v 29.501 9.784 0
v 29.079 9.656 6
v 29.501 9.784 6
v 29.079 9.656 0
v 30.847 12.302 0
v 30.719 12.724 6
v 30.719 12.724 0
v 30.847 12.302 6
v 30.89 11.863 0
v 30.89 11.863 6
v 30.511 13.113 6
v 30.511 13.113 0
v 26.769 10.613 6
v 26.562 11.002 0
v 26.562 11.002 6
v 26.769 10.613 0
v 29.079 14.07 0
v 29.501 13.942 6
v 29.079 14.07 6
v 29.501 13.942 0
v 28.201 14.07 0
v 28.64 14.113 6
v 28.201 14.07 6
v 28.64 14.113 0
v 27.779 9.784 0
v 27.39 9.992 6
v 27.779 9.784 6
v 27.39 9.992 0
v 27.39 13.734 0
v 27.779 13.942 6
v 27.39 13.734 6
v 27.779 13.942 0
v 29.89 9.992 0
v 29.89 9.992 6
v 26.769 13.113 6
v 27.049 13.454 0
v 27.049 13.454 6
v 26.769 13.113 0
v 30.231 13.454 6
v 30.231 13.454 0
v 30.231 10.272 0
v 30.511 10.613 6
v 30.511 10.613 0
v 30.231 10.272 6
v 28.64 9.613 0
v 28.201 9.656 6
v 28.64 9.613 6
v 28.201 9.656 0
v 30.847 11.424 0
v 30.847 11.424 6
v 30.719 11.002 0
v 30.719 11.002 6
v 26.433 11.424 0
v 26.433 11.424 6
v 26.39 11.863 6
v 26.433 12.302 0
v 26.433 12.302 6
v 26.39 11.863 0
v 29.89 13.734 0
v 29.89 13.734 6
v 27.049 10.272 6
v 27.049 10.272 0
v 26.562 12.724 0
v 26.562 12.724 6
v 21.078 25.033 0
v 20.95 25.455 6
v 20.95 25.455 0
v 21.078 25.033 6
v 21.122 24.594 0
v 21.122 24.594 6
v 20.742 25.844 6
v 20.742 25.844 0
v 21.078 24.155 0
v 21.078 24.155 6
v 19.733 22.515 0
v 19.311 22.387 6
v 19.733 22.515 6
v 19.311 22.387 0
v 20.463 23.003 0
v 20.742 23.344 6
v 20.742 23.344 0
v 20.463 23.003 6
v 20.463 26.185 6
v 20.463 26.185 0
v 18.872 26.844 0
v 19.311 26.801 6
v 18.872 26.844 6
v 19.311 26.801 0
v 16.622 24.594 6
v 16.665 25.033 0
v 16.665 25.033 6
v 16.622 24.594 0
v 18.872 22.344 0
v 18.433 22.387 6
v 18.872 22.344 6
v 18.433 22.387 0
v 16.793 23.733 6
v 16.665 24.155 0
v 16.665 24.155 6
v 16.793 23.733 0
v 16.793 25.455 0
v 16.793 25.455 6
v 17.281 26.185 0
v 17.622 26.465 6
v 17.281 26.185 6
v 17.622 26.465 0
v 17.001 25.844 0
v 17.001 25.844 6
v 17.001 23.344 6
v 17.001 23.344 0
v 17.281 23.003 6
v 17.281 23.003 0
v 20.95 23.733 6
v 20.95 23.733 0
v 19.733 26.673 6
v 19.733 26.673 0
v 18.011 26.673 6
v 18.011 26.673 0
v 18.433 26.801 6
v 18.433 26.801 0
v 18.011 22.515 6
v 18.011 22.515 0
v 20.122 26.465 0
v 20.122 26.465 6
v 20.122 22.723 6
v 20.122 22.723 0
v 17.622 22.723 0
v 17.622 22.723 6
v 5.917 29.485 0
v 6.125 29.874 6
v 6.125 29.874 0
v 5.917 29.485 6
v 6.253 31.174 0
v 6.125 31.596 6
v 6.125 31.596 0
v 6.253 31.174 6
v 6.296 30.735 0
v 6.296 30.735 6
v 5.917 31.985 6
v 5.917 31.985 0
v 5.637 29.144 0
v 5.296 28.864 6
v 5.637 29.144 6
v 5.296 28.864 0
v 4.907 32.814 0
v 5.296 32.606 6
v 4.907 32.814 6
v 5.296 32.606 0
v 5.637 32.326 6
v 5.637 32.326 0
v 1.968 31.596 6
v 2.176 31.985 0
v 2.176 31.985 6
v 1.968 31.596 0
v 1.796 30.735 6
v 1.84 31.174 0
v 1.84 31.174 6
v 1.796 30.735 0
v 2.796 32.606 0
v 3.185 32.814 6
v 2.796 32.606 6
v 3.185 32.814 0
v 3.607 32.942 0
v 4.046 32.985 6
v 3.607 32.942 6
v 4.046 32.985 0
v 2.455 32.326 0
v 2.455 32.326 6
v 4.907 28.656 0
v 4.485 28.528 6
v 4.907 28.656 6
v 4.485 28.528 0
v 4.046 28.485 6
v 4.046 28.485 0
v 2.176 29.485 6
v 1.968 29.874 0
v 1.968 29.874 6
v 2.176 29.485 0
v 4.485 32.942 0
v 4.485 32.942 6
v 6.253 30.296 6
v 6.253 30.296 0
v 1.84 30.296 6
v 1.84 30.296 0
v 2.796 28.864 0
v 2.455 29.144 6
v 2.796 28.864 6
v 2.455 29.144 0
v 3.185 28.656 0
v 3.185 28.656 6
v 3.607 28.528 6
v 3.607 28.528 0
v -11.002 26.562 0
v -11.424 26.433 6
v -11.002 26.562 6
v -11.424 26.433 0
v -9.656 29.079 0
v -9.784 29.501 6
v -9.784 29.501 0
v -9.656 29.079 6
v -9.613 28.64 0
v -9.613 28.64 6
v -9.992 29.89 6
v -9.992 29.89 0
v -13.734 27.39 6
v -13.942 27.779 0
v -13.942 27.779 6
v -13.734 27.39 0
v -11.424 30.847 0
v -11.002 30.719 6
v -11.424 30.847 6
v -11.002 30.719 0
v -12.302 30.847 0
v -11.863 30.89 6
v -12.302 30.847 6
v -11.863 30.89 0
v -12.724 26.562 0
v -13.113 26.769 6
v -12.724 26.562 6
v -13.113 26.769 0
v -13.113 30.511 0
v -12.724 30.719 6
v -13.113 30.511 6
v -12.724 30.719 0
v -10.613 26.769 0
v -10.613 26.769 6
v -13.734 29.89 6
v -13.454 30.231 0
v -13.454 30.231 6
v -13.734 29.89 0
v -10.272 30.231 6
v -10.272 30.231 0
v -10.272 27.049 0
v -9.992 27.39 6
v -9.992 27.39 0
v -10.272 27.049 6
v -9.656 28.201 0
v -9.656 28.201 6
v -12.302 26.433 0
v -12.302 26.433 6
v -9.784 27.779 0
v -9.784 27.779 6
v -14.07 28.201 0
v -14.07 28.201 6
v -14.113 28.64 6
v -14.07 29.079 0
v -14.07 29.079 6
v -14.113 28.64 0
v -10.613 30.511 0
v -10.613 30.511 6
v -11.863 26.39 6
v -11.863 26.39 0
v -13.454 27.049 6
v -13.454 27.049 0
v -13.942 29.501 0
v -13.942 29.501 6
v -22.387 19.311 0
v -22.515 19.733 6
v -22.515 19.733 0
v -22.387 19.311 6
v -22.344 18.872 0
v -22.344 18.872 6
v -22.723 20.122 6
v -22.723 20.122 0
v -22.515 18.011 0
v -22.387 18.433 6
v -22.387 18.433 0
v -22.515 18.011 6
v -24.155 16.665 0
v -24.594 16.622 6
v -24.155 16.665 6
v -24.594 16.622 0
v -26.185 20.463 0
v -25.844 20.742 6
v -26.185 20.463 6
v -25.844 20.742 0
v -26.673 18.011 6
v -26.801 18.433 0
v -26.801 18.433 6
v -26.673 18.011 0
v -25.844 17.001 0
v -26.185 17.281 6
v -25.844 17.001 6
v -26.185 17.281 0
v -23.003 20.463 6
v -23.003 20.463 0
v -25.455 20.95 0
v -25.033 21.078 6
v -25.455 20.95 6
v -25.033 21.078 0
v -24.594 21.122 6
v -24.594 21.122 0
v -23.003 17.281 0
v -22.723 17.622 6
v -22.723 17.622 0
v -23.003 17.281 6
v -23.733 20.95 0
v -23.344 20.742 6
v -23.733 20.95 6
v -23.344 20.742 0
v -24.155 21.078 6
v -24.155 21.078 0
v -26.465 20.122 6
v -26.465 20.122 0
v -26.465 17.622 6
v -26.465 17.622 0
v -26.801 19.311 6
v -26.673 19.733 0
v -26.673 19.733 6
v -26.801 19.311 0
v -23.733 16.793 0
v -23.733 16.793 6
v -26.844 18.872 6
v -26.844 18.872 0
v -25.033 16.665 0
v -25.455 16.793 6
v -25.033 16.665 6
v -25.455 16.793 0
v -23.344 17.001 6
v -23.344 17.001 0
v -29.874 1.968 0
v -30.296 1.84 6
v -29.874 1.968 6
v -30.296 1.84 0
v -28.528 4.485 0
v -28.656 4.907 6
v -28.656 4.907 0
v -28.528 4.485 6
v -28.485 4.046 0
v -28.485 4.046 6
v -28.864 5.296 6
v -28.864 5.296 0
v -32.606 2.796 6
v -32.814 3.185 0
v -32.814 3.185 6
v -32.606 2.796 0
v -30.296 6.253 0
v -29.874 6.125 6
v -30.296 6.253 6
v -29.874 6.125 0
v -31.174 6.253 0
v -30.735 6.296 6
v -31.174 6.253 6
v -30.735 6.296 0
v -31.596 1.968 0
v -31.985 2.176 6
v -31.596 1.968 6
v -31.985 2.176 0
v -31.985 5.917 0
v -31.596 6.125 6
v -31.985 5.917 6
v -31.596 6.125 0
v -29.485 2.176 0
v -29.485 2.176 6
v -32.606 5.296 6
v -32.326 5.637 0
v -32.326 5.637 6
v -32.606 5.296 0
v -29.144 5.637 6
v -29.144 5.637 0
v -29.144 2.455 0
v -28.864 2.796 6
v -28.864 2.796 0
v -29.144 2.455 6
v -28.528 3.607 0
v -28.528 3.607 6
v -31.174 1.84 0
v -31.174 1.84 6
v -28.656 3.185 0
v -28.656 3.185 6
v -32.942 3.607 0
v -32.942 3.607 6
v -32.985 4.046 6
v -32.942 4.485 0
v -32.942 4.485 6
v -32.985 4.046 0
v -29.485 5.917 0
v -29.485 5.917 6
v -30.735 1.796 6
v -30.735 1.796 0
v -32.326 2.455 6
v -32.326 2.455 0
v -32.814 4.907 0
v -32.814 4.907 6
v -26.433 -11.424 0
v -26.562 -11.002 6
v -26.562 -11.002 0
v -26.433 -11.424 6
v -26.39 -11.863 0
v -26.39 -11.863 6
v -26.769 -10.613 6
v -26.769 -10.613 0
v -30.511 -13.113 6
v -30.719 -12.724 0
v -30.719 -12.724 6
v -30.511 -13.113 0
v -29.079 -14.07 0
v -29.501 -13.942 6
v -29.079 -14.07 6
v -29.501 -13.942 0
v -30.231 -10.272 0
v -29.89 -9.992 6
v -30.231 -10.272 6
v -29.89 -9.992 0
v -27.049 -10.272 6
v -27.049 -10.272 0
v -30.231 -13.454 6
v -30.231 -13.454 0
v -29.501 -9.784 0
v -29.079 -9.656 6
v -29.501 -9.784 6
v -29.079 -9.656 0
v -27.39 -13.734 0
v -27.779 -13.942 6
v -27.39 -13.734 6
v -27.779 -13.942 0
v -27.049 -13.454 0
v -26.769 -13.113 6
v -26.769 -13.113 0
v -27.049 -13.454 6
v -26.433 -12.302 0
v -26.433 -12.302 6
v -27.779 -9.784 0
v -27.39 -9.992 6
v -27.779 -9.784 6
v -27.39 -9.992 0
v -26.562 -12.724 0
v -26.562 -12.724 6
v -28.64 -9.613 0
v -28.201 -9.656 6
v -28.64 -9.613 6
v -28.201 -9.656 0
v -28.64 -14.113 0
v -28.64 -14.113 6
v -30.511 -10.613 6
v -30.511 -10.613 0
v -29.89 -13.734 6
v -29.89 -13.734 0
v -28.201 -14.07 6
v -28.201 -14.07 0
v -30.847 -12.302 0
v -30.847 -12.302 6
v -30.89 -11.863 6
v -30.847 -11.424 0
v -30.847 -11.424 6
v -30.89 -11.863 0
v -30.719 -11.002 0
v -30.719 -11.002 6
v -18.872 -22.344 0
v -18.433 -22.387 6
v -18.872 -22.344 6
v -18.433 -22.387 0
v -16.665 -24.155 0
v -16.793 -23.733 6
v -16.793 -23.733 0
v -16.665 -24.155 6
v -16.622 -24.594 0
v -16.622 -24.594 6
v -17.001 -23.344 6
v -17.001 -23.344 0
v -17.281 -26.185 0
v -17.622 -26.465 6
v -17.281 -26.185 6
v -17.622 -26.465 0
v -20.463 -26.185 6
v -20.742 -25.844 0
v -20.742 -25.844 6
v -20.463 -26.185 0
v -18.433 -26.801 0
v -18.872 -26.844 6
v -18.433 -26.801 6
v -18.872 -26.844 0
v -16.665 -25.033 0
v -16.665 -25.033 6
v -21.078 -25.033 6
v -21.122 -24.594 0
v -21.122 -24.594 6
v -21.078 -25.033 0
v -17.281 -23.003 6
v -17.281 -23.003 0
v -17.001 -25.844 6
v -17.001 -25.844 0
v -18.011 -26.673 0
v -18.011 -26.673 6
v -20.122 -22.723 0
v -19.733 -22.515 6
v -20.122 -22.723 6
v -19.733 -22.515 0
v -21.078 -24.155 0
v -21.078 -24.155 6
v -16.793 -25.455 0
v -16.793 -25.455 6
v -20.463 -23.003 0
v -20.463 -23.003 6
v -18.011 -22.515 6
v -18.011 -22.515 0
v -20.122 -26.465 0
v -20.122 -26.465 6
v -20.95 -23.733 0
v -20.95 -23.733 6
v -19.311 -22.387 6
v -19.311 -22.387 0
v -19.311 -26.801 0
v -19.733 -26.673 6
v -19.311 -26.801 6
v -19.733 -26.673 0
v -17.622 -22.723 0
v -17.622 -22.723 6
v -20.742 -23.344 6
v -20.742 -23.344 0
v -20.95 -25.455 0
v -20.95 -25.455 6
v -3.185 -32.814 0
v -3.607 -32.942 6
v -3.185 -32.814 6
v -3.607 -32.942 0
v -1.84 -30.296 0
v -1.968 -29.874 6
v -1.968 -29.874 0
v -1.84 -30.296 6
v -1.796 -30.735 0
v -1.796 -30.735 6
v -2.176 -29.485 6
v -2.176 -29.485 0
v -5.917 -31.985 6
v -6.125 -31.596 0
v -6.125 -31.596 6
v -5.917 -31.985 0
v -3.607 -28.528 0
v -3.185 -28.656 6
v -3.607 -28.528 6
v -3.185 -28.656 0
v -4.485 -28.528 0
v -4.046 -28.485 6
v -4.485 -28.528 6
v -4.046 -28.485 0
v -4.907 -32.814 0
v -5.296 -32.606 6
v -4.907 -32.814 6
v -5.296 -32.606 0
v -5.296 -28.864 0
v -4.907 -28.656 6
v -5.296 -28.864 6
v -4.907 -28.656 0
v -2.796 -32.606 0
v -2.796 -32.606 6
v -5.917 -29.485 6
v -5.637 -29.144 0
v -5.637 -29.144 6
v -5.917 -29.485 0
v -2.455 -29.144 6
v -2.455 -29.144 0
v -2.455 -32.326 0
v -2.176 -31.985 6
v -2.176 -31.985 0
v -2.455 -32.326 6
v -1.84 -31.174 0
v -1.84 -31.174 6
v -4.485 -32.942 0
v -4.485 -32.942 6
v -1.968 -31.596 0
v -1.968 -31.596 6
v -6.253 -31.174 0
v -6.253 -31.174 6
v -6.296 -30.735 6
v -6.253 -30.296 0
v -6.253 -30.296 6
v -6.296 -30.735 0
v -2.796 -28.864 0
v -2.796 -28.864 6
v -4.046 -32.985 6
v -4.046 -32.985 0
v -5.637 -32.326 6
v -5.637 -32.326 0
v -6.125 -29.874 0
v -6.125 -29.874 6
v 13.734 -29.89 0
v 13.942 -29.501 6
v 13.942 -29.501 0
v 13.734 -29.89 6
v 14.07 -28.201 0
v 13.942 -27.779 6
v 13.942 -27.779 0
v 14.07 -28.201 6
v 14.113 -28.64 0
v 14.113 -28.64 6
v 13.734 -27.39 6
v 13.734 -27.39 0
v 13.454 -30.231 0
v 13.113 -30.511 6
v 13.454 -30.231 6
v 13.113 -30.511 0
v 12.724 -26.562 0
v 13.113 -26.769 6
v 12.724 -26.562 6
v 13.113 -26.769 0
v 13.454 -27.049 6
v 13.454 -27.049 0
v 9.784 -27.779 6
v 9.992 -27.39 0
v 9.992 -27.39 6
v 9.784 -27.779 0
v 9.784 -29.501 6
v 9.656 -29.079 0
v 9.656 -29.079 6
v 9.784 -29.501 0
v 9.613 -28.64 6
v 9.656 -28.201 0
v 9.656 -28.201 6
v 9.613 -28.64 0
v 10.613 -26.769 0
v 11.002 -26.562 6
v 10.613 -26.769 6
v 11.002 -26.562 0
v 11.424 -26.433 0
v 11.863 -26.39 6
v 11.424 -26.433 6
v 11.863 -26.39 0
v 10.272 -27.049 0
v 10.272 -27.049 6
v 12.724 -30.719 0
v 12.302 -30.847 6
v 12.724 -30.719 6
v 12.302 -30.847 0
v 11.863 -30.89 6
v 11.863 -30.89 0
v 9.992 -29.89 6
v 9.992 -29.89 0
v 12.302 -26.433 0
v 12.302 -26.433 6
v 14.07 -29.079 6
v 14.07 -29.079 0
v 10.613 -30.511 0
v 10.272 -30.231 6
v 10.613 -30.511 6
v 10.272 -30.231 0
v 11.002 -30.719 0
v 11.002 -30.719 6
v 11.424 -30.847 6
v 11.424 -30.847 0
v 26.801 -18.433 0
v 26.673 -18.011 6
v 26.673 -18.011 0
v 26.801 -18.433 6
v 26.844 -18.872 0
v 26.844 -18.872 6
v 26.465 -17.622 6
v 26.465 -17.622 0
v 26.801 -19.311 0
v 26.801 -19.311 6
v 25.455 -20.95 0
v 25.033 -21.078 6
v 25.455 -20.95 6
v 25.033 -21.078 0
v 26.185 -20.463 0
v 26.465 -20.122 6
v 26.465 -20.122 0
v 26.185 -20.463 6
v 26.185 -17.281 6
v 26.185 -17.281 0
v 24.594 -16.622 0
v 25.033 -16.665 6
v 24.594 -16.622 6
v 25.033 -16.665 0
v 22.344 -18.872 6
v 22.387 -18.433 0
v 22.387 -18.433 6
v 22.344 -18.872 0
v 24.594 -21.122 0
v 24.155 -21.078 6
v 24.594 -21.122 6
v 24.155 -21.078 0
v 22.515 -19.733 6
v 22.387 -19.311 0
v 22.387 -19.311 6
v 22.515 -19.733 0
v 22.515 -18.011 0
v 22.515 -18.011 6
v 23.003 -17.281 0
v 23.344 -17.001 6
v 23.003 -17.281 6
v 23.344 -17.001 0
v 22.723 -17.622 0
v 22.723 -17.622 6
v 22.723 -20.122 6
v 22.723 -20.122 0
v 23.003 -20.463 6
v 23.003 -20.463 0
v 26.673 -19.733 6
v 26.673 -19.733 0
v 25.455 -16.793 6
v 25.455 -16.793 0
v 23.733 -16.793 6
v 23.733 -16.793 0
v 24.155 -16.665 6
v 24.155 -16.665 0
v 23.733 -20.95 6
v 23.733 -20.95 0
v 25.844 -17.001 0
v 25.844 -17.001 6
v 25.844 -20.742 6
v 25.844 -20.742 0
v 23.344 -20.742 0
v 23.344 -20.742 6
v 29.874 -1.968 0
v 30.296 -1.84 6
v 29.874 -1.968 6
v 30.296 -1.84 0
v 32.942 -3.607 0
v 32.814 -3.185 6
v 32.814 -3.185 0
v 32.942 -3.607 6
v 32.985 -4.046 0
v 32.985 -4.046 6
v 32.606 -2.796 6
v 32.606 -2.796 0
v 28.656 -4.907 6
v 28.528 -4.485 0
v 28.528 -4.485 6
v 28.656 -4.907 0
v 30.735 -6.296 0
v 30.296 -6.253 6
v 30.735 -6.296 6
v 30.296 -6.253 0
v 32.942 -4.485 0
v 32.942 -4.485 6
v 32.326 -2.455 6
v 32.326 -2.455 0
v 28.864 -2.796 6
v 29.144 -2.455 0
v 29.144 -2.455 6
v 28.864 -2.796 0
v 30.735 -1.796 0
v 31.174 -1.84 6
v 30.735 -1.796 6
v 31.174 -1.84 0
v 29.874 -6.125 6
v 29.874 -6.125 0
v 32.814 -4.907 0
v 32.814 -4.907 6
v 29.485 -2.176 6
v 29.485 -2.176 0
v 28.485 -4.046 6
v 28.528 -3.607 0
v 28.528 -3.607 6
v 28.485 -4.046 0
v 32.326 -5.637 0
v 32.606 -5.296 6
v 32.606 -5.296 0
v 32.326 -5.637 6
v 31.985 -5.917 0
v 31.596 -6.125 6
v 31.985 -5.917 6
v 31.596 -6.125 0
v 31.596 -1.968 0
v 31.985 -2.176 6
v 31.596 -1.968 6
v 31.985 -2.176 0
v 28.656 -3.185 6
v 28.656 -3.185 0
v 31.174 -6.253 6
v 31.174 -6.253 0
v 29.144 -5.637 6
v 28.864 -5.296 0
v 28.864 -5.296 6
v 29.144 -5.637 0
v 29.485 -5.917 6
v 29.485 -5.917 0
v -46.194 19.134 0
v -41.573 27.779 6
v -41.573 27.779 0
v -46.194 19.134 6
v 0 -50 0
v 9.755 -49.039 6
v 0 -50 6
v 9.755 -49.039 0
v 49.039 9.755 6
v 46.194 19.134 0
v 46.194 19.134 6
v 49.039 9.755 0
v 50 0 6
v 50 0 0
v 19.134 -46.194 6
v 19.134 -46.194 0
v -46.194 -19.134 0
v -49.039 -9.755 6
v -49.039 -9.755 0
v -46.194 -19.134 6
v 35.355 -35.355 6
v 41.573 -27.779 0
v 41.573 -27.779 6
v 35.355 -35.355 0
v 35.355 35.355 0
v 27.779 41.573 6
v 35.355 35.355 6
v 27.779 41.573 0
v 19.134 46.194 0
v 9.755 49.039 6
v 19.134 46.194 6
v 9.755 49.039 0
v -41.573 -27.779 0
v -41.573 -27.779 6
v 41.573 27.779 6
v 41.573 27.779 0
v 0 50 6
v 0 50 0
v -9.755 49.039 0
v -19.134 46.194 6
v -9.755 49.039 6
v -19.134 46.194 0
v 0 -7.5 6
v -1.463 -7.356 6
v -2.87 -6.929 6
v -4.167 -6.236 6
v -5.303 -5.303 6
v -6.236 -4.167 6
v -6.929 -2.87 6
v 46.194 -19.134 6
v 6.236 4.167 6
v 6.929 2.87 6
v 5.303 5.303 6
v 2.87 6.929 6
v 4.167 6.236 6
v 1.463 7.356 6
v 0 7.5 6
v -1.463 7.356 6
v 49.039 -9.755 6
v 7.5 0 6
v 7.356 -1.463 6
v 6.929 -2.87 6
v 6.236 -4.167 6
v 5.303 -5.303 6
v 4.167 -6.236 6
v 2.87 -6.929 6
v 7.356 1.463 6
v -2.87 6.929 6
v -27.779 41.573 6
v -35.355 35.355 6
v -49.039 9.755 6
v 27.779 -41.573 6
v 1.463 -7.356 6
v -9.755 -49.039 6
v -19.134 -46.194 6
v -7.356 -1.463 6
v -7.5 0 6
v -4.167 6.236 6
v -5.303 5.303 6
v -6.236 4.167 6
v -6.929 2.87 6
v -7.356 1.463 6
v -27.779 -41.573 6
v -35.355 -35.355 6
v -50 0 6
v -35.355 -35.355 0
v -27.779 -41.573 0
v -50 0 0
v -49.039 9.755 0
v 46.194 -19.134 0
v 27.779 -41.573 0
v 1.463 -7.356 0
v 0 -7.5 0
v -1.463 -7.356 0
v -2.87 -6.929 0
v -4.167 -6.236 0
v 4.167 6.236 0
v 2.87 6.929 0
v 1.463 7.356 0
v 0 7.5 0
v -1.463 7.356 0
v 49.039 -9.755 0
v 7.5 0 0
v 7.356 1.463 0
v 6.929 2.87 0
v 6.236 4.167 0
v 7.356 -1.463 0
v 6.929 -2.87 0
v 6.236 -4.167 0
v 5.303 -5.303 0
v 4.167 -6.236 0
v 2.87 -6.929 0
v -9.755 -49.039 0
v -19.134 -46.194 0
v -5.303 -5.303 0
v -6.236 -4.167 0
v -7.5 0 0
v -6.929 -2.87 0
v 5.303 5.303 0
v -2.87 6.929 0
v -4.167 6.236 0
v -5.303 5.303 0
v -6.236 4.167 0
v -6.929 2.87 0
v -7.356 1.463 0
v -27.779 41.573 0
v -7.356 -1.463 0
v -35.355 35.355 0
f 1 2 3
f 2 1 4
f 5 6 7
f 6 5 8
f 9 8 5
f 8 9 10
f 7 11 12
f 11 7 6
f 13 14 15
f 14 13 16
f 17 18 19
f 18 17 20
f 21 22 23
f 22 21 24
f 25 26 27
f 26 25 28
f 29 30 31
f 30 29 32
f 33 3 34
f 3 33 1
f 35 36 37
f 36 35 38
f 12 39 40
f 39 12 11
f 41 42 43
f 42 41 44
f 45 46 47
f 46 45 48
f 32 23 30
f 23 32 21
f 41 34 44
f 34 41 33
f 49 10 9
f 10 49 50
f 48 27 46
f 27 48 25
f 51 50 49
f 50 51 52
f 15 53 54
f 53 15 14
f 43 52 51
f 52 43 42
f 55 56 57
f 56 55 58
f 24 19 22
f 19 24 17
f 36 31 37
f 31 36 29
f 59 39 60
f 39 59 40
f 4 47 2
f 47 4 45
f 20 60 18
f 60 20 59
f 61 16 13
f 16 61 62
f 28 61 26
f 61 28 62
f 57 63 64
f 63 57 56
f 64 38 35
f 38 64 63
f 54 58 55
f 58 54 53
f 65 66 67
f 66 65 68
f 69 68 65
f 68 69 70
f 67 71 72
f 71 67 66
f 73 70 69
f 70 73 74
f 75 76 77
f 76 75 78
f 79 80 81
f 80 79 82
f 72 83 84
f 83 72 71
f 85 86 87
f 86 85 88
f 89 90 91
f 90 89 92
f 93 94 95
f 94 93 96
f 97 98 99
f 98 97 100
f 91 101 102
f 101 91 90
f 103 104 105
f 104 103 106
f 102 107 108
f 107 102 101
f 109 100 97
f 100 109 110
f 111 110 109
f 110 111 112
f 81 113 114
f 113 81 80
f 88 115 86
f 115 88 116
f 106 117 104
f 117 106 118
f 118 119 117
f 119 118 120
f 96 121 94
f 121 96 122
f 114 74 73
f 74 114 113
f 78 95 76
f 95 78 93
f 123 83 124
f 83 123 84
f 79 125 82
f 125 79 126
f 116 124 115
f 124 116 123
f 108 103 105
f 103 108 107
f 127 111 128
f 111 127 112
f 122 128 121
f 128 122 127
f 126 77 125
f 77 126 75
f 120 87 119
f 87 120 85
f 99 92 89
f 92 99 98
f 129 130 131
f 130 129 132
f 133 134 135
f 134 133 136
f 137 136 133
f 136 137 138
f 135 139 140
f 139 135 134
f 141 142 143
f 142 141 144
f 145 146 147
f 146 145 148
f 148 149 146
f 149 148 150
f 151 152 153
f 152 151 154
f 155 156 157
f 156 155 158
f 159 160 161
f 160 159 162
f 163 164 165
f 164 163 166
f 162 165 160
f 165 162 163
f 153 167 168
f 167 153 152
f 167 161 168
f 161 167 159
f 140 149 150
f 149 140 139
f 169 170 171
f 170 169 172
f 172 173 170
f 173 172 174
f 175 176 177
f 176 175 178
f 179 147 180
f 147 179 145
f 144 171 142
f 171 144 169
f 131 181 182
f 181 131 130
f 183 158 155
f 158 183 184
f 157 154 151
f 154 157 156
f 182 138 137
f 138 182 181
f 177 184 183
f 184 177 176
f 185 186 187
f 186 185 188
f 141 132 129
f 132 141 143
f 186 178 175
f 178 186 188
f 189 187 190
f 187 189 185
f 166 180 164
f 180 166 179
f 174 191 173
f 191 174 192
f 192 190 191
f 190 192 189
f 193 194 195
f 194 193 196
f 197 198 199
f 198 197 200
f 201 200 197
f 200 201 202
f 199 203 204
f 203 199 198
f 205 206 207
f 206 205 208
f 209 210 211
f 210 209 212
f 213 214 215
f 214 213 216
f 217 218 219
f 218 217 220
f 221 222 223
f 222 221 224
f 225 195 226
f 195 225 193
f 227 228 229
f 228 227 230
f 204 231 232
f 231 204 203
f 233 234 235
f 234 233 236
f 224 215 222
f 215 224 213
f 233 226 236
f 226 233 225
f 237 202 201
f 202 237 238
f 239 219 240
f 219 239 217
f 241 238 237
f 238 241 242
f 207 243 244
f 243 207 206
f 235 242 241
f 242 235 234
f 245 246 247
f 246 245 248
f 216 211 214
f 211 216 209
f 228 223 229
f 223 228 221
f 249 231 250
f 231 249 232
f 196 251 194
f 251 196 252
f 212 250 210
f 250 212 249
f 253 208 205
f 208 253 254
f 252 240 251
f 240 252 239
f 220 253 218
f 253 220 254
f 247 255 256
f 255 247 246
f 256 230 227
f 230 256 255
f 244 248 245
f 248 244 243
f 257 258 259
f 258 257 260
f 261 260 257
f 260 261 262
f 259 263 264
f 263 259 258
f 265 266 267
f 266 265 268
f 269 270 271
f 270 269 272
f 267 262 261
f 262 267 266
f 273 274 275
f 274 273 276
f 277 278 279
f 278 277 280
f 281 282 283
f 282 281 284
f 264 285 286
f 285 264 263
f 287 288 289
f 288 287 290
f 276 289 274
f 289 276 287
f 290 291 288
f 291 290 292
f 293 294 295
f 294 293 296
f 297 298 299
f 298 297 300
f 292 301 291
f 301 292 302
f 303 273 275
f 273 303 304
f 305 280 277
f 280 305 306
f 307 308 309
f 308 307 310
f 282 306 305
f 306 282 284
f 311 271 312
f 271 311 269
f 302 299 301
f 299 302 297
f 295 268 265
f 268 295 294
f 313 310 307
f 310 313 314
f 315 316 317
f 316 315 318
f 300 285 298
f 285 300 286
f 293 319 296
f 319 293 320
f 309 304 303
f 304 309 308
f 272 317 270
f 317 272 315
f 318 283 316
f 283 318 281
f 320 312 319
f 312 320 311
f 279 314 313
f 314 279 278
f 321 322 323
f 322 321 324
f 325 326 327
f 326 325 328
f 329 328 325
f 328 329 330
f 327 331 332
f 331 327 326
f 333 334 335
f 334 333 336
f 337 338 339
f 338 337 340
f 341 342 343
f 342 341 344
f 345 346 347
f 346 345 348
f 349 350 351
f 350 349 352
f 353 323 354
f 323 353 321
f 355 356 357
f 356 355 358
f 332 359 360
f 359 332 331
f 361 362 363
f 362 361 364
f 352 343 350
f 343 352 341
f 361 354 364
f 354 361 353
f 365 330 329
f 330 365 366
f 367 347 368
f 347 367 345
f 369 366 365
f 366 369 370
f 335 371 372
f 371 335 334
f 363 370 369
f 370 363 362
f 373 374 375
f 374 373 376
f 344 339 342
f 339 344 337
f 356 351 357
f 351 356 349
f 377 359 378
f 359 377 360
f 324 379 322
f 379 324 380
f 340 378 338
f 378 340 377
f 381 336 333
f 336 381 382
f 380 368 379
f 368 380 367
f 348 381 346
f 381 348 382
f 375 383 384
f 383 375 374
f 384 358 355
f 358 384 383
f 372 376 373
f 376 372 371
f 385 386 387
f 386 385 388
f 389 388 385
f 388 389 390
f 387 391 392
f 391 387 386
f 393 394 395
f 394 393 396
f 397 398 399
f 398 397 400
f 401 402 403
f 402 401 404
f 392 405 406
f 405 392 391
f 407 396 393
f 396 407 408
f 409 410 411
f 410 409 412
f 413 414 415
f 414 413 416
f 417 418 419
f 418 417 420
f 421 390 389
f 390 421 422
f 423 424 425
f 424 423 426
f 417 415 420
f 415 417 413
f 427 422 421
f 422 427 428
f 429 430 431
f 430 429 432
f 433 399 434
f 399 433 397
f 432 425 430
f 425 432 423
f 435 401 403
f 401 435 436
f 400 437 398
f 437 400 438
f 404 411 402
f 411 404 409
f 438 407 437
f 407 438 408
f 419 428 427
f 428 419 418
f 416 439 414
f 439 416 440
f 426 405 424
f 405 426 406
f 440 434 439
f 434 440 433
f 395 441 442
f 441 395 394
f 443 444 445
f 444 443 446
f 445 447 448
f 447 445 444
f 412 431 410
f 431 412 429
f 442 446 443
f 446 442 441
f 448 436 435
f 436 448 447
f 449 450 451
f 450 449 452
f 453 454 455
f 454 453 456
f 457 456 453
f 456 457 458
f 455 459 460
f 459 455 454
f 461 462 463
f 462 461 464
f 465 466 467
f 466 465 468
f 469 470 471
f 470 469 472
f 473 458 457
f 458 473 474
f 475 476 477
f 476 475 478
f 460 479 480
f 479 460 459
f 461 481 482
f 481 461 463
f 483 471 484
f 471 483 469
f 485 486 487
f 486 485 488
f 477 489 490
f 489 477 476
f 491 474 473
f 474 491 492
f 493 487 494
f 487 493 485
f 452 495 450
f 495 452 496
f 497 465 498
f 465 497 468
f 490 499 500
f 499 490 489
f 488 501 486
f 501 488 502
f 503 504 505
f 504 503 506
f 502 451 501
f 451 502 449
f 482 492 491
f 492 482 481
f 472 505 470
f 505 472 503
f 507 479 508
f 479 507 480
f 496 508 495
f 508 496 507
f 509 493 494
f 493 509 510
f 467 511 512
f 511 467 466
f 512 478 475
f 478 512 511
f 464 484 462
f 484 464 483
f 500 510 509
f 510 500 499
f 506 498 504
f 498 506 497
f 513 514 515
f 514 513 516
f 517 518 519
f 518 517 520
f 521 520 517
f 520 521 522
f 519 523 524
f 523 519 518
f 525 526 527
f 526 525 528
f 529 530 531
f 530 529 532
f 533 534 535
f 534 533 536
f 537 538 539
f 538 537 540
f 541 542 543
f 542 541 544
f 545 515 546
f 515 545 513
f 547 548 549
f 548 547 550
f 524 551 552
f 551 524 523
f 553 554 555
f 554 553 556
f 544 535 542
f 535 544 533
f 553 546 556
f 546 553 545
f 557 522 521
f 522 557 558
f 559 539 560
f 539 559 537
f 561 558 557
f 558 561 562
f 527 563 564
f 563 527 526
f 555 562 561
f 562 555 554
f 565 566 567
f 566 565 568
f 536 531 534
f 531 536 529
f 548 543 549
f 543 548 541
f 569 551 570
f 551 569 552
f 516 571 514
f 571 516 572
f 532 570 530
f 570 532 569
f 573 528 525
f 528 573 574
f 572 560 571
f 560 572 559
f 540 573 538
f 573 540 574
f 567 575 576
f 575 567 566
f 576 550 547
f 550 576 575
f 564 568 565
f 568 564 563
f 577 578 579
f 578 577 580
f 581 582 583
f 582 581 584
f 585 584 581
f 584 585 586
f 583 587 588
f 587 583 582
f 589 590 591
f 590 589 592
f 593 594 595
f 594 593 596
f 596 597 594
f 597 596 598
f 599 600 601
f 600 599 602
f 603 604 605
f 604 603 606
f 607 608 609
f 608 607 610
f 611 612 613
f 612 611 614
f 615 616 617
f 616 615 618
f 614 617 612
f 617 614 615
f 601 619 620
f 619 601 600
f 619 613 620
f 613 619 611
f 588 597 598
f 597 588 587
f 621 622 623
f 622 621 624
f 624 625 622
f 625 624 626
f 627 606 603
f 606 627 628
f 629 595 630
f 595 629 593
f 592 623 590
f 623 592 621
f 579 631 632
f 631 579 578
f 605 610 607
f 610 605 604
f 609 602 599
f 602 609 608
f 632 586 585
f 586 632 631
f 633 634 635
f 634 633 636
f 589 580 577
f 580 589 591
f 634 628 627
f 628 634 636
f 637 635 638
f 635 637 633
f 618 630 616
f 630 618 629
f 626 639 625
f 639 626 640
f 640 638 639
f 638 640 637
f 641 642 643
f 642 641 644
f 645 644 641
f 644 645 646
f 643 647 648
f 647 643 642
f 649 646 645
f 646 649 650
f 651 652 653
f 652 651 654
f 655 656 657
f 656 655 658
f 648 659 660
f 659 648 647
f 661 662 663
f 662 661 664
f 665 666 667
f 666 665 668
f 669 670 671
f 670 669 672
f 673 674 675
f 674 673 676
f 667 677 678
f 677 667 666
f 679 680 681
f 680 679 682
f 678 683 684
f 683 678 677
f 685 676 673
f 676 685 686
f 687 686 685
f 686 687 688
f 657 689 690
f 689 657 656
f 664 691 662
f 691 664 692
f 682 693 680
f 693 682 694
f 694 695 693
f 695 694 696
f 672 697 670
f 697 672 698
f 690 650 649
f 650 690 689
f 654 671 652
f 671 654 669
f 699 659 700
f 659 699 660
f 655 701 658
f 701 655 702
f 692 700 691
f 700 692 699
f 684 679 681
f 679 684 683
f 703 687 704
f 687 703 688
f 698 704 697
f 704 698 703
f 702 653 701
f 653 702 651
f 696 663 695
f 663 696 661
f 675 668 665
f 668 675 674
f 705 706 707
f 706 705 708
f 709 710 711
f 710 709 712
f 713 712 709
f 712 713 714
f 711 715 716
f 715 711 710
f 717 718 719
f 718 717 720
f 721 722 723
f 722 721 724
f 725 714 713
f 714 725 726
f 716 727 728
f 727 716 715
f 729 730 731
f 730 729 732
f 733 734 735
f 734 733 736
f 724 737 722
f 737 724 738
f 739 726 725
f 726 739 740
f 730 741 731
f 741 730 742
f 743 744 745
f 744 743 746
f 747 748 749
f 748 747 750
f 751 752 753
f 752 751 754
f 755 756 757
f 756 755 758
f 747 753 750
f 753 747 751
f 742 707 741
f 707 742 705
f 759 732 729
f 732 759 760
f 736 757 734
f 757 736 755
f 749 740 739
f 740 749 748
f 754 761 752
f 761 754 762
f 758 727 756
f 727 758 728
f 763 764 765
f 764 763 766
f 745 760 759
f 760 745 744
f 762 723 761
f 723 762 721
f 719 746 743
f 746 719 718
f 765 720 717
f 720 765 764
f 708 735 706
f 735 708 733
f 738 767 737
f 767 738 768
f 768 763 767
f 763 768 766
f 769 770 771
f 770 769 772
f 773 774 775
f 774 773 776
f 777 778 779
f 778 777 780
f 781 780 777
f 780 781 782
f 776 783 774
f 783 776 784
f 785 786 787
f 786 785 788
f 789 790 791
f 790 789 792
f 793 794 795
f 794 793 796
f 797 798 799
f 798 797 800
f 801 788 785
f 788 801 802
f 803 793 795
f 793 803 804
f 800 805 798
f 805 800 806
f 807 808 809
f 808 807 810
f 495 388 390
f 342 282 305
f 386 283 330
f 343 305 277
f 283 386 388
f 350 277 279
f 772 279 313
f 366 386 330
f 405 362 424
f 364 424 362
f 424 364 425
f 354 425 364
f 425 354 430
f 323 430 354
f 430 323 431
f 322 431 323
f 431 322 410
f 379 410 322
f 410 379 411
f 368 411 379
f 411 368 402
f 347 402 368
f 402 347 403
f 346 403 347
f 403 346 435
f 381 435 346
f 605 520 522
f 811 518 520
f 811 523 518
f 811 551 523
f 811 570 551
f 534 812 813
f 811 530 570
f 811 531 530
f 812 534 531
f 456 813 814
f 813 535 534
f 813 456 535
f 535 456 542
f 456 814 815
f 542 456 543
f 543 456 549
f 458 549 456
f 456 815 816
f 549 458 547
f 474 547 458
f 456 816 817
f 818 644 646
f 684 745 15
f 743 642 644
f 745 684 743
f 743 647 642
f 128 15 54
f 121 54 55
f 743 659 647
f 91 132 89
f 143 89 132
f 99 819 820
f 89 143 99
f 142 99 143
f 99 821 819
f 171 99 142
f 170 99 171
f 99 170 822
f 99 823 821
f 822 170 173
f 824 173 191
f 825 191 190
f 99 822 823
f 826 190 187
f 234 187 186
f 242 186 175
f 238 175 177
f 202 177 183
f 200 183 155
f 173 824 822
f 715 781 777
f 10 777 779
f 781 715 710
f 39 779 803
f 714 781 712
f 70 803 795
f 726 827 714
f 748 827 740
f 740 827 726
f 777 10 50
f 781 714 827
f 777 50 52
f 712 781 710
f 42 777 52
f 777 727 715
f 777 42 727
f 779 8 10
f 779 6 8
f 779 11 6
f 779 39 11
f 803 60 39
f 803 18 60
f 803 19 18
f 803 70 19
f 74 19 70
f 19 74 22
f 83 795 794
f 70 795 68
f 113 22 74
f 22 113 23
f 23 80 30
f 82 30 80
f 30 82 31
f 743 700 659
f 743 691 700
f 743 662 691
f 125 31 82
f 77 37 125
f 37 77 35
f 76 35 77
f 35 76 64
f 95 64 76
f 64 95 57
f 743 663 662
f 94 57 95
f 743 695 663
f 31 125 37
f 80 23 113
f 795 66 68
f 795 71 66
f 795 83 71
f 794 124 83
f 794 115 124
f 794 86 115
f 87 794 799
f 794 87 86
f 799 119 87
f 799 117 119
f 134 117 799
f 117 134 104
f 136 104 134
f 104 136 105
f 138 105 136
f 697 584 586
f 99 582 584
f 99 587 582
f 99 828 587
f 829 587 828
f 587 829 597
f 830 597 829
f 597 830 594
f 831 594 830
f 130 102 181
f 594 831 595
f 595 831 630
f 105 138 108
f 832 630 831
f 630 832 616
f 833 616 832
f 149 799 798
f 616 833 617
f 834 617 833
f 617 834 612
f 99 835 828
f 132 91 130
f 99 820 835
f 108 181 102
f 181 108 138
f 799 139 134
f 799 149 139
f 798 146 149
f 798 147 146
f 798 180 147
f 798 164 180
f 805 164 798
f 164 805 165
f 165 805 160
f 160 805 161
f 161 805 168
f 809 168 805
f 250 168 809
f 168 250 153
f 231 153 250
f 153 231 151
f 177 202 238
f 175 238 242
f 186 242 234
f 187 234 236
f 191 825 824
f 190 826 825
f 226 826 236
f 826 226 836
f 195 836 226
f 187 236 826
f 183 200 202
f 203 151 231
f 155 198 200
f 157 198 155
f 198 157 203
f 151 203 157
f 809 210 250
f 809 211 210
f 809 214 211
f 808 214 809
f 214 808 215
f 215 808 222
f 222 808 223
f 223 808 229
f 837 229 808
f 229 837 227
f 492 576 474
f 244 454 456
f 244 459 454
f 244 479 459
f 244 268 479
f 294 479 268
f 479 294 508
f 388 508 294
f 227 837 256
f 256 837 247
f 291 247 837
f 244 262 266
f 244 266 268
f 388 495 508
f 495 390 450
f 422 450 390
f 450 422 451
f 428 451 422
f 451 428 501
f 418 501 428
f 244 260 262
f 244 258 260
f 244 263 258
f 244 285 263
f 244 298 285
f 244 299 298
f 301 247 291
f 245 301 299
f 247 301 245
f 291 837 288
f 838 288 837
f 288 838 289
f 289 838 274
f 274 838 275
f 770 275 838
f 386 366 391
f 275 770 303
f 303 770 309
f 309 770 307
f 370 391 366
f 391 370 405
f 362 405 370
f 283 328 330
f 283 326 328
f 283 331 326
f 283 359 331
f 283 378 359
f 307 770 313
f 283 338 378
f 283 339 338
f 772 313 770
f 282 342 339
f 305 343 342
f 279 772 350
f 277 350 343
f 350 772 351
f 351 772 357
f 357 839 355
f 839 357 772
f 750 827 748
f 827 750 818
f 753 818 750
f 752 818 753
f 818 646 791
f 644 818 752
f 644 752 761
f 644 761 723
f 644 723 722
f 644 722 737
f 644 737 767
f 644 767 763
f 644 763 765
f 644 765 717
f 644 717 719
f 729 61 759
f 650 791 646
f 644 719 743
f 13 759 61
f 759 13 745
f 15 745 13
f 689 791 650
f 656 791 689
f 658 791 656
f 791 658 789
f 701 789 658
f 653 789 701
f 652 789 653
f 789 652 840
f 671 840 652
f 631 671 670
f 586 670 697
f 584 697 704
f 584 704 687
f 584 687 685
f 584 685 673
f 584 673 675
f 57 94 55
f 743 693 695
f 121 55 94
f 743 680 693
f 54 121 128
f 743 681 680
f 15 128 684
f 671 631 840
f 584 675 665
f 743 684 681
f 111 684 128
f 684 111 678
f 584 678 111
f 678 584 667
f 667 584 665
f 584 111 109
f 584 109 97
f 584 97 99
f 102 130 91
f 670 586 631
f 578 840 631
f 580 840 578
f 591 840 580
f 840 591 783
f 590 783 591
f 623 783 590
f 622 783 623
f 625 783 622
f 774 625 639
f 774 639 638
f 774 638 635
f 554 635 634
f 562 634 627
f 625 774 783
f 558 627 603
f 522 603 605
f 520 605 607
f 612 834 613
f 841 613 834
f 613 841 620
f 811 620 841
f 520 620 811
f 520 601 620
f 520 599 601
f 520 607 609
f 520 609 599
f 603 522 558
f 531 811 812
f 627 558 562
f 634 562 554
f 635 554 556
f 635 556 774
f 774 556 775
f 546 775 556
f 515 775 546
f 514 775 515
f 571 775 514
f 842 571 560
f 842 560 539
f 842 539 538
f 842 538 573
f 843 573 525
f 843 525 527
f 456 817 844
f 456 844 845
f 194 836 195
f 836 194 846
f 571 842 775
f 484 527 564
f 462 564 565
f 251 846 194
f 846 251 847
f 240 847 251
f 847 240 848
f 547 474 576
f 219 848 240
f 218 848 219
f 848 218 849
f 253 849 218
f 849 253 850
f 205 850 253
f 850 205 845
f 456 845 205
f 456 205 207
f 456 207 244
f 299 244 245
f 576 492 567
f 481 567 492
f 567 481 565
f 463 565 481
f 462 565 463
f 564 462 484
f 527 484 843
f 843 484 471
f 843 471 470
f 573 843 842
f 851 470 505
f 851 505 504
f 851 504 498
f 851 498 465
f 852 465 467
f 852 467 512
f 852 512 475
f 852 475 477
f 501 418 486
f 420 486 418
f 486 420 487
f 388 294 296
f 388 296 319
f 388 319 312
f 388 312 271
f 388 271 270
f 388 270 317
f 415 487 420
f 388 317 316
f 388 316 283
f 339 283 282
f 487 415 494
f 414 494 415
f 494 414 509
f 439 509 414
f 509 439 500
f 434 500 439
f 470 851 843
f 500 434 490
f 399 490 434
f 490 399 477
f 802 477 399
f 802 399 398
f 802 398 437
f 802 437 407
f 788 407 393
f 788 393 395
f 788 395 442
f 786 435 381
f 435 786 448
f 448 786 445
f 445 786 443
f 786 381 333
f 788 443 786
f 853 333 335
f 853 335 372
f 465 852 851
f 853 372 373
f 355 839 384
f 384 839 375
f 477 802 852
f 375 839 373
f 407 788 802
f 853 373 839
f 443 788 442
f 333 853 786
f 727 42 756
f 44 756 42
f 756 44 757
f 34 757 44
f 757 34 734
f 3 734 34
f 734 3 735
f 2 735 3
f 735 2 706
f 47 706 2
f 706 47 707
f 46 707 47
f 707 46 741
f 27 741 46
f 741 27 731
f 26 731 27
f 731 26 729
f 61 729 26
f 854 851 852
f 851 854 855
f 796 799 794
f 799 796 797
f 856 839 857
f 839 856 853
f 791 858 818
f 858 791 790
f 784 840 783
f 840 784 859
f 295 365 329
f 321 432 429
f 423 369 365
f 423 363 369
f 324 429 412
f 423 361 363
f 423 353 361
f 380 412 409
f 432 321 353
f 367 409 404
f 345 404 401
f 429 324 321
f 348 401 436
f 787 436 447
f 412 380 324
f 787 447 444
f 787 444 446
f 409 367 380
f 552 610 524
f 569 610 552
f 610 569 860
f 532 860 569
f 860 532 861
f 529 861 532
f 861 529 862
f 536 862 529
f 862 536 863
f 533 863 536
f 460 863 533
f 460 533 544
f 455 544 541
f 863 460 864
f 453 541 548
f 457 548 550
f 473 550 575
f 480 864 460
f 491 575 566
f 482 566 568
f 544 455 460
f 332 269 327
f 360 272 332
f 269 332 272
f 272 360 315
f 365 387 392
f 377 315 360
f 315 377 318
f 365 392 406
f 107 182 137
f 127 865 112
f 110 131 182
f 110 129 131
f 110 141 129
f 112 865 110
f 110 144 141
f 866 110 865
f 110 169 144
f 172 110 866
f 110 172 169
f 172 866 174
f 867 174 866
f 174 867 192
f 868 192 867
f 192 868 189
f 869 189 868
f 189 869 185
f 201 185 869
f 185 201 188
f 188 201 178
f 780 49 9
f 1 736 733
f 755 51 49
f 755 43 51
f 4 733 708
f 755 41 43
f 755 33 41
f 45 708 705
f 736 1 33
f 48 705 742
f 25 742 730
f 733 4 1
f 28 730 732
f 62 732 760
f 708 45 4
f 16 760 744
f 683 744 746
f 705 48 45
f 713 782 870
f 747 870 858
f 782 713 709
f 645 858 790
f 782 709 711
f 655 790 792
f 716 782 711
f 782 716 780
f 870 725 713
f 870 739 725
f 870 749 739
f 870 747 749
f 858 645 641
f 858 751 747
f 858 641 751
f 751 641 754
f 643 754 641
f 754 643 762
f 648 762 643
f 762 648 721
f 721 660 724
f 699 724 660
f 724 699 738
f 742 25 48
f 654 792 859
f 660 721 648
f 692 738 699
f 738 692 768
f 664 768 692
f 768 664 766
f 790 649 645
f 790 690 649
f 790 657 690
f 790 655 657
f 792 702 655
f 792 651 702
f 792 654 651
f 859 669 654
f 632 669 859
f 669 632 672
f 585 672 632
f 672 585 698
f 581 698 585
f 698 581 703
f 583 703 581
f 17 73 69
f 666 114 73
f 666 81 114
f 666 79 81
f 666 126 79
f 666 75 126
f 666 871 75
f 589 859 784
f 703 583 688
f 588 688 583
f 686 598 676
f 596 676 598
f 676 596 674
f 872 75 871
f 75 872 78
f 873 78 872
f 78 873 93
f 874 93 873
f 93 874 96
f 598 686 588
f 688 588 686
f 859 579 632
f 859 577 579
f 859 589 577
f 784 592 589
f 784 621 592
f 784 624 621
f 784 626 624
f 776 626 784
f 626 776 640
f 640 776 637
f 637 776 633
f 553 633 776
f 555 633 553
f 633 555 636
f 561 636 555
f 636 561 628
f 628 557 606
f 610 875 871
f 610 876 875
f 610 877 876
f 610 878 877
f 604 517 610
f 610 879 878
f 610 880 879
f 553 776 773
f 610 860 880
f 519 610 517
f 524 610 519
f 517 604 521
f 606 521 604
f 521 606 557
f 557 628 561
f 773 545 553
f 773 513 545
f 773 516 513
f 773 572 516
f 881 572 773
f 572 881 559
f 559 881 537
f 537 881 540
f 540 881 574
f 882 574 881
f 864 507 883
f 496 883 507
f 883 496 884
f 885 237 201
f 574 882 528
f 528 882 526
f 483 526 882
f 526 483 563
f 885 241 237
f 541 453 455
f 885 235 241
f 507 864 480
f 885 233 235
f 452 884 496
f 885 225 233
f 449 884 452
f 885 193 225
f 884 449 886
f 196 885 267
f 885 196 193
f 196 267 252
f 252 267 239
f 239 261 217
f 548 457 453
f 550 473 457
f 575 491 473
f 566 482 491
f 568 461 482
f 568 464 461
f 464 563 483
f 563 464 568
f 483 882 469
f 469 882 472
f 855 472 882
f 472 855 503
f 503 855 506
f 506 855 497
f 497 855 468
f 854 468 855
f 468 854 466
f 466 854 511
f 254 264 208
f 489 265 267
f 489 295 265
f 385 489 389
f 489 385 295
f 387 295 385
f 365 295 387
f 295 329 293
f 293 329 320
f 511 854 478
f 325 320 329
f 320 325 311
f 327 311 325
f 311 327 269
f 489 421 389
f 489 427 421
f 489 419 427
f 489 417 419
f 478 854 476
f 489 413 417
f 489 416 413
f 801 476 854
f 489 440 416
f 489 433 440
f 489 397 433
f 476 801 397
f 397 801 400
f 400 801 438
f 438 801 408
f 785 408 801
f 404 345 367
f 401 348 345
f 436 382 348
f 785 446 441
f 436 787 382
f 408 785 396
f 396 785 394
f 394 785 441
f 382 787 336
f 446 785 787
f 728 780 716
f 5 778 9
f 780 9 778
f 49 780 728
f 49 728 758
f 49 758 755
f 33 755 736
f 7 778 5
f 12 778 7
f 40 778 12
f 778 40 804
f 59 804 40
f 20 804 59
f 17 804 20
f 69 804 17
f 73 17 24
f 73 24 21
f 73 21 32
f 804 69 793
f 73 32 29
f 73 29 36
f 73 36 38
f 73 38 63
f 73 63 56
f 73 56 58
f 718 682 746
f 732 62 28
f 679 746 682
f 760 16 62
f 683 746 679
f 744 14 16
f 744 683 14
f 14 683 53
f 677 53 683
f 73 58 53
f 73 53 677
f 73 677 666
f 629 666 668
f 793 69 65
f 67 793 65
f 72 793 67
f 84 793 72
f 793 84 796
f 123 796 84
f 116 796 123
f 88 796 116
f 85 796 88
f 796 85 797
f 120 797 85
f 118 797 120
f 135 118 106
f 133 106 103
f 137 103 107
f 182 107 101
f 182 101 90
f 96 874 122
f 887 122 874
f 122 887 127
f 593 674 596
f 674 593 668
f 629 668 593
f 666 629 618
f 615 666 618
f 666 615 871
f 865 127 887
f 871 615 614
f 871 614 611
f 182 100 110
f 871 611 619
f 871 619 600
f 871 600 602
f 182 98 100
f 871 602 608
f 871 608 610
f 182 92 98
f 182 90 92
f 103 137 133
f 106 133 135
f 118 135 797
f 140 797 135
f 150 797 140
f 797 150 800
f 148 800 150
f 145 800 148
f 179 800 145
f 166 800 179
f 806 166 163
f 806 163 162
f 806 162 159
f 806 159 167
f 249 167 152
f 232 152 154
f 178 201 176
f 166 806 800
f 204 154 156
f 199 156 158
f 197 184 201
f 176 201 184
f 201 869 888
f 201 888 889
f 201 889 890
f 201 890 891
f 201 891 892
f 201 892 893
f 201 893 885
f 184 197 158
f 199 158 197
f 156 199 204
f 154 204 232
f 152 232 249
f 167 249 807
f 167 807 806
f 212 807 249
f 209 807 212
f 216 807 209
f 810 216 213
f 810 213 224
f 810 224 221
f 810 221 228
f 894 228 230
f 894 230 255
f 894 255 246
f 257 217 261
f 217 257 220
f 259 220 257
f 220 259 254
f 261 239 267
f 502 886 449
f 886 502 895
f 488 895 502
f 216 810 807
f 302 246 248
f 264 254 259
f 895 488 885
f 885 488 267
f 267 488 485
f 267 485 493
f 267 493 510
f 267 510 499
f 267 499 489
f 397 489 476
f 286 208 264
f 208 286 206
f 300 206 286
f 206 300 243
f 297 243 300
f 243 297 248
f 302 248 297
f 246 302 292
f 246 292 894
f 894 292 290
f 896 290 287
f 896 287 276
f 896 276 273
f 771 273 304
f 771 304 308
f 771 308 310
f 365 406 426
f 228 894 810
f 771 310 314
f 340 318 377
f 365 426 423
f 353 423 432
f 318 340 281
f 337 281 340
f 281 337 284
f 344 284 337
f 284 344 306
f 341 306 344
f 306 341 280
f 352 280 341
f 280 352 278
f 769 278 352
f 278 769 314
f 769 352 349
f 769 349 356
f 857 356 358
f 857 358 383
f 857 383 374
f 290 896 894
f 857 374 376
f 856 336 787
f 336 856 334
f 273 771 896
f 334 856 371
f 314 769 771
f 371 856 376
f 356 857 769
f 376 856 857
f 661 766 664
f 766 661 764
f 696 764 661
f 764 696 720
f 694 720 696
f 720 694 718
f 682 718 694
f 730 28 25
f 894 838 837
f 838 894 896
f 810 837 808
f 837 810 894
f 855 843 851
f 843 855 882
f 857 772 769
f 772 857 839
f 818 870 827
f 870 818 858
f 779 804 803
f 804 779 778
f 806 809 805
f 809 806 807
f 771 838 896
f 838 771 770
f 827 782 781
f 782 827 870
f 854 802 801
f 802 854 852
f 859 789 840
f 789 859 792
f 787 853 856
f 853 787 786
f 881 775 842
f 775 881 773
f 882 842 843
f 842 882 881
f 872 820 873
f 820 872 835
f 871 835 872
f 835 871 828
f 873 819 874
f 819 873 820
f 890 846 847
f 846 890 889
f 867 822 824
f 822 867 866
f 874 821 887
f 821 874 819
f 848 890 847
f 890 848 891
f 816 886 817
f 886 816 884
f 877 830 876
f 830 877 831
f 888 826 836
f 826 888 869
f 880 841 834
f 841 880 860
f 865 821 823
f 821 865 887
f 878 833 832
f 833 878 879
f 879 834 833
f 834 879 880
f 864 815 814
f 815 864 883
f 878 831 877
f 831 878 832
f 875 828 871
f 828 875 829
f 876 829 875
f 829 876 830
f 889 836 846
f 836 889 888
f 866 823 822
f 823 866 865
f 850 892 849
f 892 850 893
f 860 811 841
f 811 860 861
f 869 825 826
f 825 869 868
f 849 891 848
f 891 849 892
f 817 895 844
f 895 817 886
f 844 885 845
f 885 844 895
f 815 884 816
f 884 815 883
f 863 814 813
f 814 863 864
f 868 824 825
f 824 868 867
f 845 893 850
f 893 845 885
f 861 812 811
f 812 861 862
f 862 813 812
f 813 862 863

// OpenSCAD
$fn = 32;

// ----------------------------------------------------------------------
// Flange Ø100 x 6
// 12 holes on a Ø62 bolt circle, bolted joints
// ----------------------------------------------------------------------

// --- parameters (mm) ---
flange_d = 100;    // outside diameter of the flange
thickness = 6;     // flange thickness
holes = 12;        // number of bolt holes
pcd = 62;          // bolt circle diameter
start_deg = 22.5;  // angle of the first hole, from +X
hole_d = 4.5;      // bolt hole diameter
bore_d = 15;       // central through bore
hub_d = 27;        // hub outside diameter
hub_h = 0;         // hub height above the flange face (0 = no hub)

// --- derived feature positions (mm) ---
height = thickness + hub_h;  // = 6   overall height of the part
pcd_r = pcd / 2;             // = 31   bolt circle radius
hole_step = 360 / holes;     // = 30   angular pitch
feature_centers = [
  [pcd_r * cos(start_deg + 0 * hole_step), pcd_r * sin(start_deg + 0 * hole_step)],
  [pcd_r * cos(start_deg + 1 * hole_step), pcd_r * sin(start_deg + 1 * hole_step)],
  [pcd_r * cos(start_deg + 2 * hole_step), pcd_r * sin(start_deg + 2 * hole_step)],
  [pcd_r * cos(start_deg + 3 * hole_step), pcd_r * sin(start_deg + 3 * hole_step)],
  [pcd_r * cos(start_deg + 4 * hole_step), pcd_r * sin(start_deg + 4 * hole_step)],
  [pcd_r * cos(start_deg + 5 * hole_step), pcd_r * sin(start_deg + 5 * hole_step)],
  [pcd_r * cos(start_deg + 6 * hole_step), pcd_r * sin(start_deg + 6 * hole_step)],
  [pcd_r * cos(start_deg + 7 * hole_step), pcd_r * sin(start_deg + 7 * hole_step)],
  [pcd_r * cos(start_deg + 8 * hole_step), pcd_r * sin(start_deg + 8 * hole_step)],
  [pcd_r * cos(start_deg + 9 * hole_step), pcd_r * sin(start_deg + 9 * hole_step)],
  [pcd_r * cos(start_deg + 10 * hole_step), pcd_r * sin(start_deg + 10 * hole_step)],
  [pcd_r * cos(start_deg + 11 * hole_step), pcd_r * sin(start_deg + 11 * hole_step)]
];   // bolt hole centres on the pitch circle

// flange disc, every hole and the bore cut straight through
difference() {
  union() {
    cylinder(d = flange_d, h = thickness);
  }
  translate([0, 0, -1]) cylinder(d = bore_d, h = height + 2);  // bore, through
  for (centre = feature_centers)
    translate([centre[0], centre[1], -1]) cylinder(d = hole_d, h = thickness + 2);
}
